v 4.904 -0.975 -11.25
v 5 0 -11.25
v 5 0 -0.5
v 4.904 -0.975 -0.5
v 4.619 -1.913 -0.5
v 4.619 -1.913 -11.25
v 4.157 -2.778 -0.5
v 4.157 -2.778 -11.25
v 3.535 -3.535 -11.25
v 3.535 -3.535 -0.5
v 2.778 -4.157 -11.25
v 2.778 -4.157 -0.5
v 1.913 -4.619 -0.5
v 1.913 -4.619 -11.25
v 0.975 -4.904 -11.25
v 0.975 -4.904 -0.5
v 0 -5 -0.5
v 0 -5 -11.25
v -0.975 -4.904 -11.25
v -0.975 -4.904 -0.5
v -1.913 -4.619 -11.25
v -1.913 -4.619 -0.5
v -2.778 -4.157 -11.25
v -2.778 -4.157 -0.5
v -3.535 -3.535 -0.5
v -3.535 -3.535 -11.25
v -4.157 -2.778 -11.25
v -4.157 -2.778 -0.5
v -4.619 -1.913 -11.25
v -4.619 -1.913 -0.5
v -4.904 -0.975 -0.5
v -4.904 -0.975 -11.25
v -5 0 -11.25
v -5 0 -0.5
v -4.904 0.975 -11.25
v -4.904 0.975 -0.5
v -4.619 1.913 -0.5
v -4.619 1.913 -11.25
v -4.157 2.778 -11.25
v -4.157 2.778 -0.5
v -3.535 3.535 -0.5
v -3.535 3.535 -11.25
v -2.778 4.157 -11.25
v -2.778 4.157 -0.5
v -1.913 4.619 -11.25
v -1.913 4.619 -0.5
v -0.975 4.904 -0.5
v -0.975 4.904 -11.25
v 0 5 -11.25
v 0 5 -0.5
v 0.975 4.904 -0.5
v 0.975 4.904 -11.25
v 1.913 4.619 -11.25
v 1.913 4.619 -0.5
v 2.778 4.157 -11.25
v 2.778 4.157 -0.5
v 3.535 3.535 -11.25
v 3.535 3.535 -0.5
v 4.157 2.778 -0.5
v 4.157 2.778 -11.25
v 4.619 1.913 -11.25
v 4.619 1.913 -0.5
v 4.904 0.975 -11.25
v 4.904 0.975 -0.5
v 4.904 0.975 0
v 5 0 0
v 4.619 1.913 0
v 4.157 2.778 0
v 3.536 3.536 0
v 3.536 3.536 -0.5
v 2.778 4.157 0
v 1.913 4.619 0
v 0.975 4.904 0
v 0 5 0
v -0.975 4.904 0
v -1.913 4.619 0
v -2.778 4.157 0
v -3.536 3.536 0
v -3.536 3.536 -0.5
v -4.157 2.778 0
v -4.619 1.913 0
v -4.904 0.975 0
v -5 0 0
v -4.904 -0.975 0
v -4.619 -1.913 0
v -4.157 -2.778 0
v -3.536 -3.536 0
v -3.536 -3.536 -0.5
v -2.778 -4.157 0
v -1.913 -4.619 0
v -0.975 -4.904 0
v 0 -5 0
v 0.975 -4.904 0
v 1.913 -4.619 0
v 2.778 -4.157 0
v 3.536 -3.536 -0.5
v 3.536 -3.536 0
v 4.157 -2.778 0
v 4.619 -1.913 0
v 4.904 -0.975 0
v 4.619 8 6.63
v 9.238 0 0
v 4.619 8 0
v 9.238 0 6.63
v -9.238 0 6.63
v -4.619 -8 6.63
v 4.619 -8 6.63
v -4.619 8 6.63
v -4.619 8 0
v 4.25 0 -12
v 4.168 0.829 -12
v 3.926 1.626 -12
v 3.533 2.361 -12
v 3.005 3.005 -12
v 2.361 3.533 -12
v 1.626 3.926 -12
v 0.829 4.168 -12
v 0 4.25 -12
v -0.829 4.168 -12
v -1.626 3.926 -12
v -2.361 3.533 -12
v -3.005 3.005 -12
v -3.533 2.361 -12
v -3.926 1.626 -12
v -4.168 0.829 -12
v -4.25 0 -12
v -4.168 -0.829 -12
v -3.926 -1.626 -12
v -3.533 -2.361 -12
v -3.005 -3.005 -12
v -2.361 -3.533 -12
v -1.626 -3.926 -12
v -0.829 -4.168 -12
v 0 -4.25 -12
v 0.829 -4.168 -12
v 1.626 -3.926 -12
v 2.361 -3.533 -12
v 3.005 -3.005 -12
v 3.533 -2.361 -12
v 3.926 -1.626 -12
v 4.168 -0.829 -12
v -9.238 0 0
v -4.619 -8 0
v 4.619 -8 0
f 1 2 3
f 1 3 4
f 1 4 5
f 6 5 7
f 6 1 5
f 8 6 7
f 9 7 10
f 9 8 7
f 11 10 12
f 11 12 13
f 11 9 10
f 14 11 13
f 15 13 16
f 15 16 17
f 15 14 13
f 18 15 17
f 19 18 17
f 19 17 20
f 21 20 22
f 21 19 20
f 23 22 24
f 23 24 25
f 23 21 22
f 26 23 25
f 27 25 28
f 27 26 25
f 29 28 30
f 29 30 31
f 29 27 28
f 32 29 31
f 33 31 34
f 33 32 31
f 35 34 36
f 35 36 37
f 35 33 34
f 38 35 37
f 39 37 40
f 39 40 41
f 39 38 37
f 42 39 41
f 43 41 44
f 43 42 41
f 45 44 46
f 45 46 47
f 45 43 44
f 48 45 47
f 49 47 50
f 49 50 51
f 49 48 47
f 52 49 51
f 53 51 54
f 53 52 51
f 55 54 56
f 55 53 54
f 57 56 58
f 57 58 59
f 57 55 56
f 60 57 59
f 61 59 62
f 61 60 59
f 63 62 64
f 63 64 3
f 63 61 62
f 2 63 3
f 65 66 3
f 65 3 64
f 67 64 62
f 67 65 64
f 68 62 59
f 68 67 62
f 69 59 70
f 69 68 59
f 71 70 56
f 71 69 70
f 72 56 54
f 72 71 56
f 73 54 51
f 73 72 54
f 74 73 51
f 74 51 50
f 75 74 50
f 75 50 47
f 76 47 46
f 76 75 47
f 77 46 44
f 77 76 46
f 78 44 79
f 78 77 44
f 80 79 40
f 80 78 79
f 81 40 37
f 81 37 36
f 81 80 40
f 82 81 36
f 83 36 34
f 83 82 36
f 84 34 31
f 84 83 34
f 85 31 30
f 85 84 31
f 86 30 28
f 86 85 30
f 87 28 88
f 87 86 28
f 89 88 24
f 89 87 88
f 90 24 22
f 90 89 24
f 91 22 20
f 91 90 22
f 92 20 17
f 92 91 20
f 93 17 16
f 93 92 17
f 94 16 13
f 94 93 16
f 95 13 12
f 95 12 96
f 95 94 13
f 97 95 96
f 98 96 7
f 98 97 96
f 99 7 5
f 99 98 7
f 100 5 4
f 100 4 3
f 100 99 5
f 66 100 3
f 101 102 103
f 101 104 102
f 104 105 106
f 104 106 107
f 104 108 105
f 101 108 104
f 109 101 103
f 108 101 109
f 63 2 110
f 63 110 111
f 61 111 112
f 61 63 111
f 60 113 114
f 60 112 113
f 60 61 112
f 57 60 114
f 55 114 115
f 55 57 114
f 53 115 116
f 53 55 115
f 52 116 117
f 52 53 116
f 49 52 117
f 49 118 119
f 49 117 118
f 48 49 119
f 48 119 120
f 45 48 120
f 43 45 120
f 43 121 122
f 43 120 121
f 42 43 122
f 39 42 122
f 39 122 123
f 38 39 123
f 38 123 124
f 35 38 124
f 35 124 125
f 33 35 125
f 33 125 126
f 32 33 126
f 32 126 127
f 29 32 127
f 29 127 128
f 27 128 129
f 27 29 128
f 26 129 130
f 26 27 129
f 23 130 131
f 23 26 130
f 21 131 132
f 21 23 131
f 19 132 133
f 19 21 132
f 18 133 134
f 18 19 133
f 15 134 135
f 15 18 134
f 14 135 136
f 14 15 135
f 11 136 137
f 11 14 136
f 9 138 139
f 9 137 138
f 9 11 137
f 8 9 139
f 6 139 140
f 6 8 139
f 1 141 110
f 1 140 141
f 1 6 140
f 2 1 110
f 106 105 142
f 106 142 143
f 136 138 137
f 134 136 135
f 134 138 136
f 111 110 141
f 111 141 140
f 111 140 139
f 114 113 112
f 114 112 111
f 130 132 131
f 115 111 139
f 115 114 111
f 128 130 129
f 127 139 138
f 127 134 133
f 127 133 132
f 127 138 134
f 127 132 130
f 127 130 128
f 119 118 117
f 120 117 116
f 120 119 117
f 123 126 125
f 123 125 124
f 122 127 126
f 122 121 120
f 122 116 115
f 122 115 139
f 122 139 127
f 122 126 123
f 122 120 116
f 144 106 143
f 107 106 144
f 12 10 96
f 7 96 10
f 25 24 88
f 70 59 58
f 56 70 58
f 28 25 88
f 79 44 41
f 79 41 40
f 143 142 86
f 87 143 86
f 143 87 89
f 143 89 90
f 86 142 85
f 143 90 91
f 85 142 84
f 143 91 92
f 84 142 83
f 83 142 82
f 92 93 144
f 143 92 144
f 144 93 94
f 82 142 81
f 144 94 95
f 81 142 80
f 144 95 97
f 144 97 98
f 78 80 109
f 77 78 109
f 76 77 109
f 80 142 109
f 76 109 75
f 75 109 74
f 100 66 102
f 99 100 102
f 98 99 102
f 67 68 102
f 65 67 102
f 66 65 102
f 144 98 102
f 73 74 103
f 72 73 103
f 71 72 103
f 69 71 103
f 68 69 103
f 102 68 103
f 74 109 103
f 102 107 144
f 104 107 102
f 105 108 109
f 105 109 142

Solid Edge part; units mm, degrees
sketch "Sketch1" plane through (0, 0, 0) normal (0, 0, 1) x (1, 0, 0)
  circle A0 centre (0, 0) radius 9.28
  dimension "D1" = 18.56
extrude "Protrusion1" add sketch "Sketch1" along normal blind 6.63
sketch "Sketch2" plane through (0, 0, 0) normal (0, 0, -1) x (1, 0, 0)
  circle A0 centre (0, 0) radius 5
extrude "Protrusion2" add sketch "Sketch2" along normal blind 12
sketch "Sketch3" plane through (0, 0, -12) normal (0, 0, -1) x (1, 0, 0)
  circle A0 centre (0, 0) radius 4.9997
extrude "Cutout1" cut sketch "Sketch3" against normal blind 11.5 flip side to cut
chamfer "Chamfer_1" distance 0.75 angle 45 1 edges at (-4.9997, 0, -12)
sketch "Sketch4" plane through (0, 0, 6.63) normal (0, 0, 1) x (1, 0, 0)
  line L0 (-4.703, 8) -> (4.703, 8)
  dimension "D1" = 16
extrude "Cutout2" cut sketch "Sketch4" against normal up to next material side at (0, 8.05, 6.63)
pattern_circular "Pattern1" count 6 over 360 about axis through (0, 0, 6.63) along (0, 0, 1) of "Cutout2"
properties part number "213279" material "Stainless Steel, 304"
